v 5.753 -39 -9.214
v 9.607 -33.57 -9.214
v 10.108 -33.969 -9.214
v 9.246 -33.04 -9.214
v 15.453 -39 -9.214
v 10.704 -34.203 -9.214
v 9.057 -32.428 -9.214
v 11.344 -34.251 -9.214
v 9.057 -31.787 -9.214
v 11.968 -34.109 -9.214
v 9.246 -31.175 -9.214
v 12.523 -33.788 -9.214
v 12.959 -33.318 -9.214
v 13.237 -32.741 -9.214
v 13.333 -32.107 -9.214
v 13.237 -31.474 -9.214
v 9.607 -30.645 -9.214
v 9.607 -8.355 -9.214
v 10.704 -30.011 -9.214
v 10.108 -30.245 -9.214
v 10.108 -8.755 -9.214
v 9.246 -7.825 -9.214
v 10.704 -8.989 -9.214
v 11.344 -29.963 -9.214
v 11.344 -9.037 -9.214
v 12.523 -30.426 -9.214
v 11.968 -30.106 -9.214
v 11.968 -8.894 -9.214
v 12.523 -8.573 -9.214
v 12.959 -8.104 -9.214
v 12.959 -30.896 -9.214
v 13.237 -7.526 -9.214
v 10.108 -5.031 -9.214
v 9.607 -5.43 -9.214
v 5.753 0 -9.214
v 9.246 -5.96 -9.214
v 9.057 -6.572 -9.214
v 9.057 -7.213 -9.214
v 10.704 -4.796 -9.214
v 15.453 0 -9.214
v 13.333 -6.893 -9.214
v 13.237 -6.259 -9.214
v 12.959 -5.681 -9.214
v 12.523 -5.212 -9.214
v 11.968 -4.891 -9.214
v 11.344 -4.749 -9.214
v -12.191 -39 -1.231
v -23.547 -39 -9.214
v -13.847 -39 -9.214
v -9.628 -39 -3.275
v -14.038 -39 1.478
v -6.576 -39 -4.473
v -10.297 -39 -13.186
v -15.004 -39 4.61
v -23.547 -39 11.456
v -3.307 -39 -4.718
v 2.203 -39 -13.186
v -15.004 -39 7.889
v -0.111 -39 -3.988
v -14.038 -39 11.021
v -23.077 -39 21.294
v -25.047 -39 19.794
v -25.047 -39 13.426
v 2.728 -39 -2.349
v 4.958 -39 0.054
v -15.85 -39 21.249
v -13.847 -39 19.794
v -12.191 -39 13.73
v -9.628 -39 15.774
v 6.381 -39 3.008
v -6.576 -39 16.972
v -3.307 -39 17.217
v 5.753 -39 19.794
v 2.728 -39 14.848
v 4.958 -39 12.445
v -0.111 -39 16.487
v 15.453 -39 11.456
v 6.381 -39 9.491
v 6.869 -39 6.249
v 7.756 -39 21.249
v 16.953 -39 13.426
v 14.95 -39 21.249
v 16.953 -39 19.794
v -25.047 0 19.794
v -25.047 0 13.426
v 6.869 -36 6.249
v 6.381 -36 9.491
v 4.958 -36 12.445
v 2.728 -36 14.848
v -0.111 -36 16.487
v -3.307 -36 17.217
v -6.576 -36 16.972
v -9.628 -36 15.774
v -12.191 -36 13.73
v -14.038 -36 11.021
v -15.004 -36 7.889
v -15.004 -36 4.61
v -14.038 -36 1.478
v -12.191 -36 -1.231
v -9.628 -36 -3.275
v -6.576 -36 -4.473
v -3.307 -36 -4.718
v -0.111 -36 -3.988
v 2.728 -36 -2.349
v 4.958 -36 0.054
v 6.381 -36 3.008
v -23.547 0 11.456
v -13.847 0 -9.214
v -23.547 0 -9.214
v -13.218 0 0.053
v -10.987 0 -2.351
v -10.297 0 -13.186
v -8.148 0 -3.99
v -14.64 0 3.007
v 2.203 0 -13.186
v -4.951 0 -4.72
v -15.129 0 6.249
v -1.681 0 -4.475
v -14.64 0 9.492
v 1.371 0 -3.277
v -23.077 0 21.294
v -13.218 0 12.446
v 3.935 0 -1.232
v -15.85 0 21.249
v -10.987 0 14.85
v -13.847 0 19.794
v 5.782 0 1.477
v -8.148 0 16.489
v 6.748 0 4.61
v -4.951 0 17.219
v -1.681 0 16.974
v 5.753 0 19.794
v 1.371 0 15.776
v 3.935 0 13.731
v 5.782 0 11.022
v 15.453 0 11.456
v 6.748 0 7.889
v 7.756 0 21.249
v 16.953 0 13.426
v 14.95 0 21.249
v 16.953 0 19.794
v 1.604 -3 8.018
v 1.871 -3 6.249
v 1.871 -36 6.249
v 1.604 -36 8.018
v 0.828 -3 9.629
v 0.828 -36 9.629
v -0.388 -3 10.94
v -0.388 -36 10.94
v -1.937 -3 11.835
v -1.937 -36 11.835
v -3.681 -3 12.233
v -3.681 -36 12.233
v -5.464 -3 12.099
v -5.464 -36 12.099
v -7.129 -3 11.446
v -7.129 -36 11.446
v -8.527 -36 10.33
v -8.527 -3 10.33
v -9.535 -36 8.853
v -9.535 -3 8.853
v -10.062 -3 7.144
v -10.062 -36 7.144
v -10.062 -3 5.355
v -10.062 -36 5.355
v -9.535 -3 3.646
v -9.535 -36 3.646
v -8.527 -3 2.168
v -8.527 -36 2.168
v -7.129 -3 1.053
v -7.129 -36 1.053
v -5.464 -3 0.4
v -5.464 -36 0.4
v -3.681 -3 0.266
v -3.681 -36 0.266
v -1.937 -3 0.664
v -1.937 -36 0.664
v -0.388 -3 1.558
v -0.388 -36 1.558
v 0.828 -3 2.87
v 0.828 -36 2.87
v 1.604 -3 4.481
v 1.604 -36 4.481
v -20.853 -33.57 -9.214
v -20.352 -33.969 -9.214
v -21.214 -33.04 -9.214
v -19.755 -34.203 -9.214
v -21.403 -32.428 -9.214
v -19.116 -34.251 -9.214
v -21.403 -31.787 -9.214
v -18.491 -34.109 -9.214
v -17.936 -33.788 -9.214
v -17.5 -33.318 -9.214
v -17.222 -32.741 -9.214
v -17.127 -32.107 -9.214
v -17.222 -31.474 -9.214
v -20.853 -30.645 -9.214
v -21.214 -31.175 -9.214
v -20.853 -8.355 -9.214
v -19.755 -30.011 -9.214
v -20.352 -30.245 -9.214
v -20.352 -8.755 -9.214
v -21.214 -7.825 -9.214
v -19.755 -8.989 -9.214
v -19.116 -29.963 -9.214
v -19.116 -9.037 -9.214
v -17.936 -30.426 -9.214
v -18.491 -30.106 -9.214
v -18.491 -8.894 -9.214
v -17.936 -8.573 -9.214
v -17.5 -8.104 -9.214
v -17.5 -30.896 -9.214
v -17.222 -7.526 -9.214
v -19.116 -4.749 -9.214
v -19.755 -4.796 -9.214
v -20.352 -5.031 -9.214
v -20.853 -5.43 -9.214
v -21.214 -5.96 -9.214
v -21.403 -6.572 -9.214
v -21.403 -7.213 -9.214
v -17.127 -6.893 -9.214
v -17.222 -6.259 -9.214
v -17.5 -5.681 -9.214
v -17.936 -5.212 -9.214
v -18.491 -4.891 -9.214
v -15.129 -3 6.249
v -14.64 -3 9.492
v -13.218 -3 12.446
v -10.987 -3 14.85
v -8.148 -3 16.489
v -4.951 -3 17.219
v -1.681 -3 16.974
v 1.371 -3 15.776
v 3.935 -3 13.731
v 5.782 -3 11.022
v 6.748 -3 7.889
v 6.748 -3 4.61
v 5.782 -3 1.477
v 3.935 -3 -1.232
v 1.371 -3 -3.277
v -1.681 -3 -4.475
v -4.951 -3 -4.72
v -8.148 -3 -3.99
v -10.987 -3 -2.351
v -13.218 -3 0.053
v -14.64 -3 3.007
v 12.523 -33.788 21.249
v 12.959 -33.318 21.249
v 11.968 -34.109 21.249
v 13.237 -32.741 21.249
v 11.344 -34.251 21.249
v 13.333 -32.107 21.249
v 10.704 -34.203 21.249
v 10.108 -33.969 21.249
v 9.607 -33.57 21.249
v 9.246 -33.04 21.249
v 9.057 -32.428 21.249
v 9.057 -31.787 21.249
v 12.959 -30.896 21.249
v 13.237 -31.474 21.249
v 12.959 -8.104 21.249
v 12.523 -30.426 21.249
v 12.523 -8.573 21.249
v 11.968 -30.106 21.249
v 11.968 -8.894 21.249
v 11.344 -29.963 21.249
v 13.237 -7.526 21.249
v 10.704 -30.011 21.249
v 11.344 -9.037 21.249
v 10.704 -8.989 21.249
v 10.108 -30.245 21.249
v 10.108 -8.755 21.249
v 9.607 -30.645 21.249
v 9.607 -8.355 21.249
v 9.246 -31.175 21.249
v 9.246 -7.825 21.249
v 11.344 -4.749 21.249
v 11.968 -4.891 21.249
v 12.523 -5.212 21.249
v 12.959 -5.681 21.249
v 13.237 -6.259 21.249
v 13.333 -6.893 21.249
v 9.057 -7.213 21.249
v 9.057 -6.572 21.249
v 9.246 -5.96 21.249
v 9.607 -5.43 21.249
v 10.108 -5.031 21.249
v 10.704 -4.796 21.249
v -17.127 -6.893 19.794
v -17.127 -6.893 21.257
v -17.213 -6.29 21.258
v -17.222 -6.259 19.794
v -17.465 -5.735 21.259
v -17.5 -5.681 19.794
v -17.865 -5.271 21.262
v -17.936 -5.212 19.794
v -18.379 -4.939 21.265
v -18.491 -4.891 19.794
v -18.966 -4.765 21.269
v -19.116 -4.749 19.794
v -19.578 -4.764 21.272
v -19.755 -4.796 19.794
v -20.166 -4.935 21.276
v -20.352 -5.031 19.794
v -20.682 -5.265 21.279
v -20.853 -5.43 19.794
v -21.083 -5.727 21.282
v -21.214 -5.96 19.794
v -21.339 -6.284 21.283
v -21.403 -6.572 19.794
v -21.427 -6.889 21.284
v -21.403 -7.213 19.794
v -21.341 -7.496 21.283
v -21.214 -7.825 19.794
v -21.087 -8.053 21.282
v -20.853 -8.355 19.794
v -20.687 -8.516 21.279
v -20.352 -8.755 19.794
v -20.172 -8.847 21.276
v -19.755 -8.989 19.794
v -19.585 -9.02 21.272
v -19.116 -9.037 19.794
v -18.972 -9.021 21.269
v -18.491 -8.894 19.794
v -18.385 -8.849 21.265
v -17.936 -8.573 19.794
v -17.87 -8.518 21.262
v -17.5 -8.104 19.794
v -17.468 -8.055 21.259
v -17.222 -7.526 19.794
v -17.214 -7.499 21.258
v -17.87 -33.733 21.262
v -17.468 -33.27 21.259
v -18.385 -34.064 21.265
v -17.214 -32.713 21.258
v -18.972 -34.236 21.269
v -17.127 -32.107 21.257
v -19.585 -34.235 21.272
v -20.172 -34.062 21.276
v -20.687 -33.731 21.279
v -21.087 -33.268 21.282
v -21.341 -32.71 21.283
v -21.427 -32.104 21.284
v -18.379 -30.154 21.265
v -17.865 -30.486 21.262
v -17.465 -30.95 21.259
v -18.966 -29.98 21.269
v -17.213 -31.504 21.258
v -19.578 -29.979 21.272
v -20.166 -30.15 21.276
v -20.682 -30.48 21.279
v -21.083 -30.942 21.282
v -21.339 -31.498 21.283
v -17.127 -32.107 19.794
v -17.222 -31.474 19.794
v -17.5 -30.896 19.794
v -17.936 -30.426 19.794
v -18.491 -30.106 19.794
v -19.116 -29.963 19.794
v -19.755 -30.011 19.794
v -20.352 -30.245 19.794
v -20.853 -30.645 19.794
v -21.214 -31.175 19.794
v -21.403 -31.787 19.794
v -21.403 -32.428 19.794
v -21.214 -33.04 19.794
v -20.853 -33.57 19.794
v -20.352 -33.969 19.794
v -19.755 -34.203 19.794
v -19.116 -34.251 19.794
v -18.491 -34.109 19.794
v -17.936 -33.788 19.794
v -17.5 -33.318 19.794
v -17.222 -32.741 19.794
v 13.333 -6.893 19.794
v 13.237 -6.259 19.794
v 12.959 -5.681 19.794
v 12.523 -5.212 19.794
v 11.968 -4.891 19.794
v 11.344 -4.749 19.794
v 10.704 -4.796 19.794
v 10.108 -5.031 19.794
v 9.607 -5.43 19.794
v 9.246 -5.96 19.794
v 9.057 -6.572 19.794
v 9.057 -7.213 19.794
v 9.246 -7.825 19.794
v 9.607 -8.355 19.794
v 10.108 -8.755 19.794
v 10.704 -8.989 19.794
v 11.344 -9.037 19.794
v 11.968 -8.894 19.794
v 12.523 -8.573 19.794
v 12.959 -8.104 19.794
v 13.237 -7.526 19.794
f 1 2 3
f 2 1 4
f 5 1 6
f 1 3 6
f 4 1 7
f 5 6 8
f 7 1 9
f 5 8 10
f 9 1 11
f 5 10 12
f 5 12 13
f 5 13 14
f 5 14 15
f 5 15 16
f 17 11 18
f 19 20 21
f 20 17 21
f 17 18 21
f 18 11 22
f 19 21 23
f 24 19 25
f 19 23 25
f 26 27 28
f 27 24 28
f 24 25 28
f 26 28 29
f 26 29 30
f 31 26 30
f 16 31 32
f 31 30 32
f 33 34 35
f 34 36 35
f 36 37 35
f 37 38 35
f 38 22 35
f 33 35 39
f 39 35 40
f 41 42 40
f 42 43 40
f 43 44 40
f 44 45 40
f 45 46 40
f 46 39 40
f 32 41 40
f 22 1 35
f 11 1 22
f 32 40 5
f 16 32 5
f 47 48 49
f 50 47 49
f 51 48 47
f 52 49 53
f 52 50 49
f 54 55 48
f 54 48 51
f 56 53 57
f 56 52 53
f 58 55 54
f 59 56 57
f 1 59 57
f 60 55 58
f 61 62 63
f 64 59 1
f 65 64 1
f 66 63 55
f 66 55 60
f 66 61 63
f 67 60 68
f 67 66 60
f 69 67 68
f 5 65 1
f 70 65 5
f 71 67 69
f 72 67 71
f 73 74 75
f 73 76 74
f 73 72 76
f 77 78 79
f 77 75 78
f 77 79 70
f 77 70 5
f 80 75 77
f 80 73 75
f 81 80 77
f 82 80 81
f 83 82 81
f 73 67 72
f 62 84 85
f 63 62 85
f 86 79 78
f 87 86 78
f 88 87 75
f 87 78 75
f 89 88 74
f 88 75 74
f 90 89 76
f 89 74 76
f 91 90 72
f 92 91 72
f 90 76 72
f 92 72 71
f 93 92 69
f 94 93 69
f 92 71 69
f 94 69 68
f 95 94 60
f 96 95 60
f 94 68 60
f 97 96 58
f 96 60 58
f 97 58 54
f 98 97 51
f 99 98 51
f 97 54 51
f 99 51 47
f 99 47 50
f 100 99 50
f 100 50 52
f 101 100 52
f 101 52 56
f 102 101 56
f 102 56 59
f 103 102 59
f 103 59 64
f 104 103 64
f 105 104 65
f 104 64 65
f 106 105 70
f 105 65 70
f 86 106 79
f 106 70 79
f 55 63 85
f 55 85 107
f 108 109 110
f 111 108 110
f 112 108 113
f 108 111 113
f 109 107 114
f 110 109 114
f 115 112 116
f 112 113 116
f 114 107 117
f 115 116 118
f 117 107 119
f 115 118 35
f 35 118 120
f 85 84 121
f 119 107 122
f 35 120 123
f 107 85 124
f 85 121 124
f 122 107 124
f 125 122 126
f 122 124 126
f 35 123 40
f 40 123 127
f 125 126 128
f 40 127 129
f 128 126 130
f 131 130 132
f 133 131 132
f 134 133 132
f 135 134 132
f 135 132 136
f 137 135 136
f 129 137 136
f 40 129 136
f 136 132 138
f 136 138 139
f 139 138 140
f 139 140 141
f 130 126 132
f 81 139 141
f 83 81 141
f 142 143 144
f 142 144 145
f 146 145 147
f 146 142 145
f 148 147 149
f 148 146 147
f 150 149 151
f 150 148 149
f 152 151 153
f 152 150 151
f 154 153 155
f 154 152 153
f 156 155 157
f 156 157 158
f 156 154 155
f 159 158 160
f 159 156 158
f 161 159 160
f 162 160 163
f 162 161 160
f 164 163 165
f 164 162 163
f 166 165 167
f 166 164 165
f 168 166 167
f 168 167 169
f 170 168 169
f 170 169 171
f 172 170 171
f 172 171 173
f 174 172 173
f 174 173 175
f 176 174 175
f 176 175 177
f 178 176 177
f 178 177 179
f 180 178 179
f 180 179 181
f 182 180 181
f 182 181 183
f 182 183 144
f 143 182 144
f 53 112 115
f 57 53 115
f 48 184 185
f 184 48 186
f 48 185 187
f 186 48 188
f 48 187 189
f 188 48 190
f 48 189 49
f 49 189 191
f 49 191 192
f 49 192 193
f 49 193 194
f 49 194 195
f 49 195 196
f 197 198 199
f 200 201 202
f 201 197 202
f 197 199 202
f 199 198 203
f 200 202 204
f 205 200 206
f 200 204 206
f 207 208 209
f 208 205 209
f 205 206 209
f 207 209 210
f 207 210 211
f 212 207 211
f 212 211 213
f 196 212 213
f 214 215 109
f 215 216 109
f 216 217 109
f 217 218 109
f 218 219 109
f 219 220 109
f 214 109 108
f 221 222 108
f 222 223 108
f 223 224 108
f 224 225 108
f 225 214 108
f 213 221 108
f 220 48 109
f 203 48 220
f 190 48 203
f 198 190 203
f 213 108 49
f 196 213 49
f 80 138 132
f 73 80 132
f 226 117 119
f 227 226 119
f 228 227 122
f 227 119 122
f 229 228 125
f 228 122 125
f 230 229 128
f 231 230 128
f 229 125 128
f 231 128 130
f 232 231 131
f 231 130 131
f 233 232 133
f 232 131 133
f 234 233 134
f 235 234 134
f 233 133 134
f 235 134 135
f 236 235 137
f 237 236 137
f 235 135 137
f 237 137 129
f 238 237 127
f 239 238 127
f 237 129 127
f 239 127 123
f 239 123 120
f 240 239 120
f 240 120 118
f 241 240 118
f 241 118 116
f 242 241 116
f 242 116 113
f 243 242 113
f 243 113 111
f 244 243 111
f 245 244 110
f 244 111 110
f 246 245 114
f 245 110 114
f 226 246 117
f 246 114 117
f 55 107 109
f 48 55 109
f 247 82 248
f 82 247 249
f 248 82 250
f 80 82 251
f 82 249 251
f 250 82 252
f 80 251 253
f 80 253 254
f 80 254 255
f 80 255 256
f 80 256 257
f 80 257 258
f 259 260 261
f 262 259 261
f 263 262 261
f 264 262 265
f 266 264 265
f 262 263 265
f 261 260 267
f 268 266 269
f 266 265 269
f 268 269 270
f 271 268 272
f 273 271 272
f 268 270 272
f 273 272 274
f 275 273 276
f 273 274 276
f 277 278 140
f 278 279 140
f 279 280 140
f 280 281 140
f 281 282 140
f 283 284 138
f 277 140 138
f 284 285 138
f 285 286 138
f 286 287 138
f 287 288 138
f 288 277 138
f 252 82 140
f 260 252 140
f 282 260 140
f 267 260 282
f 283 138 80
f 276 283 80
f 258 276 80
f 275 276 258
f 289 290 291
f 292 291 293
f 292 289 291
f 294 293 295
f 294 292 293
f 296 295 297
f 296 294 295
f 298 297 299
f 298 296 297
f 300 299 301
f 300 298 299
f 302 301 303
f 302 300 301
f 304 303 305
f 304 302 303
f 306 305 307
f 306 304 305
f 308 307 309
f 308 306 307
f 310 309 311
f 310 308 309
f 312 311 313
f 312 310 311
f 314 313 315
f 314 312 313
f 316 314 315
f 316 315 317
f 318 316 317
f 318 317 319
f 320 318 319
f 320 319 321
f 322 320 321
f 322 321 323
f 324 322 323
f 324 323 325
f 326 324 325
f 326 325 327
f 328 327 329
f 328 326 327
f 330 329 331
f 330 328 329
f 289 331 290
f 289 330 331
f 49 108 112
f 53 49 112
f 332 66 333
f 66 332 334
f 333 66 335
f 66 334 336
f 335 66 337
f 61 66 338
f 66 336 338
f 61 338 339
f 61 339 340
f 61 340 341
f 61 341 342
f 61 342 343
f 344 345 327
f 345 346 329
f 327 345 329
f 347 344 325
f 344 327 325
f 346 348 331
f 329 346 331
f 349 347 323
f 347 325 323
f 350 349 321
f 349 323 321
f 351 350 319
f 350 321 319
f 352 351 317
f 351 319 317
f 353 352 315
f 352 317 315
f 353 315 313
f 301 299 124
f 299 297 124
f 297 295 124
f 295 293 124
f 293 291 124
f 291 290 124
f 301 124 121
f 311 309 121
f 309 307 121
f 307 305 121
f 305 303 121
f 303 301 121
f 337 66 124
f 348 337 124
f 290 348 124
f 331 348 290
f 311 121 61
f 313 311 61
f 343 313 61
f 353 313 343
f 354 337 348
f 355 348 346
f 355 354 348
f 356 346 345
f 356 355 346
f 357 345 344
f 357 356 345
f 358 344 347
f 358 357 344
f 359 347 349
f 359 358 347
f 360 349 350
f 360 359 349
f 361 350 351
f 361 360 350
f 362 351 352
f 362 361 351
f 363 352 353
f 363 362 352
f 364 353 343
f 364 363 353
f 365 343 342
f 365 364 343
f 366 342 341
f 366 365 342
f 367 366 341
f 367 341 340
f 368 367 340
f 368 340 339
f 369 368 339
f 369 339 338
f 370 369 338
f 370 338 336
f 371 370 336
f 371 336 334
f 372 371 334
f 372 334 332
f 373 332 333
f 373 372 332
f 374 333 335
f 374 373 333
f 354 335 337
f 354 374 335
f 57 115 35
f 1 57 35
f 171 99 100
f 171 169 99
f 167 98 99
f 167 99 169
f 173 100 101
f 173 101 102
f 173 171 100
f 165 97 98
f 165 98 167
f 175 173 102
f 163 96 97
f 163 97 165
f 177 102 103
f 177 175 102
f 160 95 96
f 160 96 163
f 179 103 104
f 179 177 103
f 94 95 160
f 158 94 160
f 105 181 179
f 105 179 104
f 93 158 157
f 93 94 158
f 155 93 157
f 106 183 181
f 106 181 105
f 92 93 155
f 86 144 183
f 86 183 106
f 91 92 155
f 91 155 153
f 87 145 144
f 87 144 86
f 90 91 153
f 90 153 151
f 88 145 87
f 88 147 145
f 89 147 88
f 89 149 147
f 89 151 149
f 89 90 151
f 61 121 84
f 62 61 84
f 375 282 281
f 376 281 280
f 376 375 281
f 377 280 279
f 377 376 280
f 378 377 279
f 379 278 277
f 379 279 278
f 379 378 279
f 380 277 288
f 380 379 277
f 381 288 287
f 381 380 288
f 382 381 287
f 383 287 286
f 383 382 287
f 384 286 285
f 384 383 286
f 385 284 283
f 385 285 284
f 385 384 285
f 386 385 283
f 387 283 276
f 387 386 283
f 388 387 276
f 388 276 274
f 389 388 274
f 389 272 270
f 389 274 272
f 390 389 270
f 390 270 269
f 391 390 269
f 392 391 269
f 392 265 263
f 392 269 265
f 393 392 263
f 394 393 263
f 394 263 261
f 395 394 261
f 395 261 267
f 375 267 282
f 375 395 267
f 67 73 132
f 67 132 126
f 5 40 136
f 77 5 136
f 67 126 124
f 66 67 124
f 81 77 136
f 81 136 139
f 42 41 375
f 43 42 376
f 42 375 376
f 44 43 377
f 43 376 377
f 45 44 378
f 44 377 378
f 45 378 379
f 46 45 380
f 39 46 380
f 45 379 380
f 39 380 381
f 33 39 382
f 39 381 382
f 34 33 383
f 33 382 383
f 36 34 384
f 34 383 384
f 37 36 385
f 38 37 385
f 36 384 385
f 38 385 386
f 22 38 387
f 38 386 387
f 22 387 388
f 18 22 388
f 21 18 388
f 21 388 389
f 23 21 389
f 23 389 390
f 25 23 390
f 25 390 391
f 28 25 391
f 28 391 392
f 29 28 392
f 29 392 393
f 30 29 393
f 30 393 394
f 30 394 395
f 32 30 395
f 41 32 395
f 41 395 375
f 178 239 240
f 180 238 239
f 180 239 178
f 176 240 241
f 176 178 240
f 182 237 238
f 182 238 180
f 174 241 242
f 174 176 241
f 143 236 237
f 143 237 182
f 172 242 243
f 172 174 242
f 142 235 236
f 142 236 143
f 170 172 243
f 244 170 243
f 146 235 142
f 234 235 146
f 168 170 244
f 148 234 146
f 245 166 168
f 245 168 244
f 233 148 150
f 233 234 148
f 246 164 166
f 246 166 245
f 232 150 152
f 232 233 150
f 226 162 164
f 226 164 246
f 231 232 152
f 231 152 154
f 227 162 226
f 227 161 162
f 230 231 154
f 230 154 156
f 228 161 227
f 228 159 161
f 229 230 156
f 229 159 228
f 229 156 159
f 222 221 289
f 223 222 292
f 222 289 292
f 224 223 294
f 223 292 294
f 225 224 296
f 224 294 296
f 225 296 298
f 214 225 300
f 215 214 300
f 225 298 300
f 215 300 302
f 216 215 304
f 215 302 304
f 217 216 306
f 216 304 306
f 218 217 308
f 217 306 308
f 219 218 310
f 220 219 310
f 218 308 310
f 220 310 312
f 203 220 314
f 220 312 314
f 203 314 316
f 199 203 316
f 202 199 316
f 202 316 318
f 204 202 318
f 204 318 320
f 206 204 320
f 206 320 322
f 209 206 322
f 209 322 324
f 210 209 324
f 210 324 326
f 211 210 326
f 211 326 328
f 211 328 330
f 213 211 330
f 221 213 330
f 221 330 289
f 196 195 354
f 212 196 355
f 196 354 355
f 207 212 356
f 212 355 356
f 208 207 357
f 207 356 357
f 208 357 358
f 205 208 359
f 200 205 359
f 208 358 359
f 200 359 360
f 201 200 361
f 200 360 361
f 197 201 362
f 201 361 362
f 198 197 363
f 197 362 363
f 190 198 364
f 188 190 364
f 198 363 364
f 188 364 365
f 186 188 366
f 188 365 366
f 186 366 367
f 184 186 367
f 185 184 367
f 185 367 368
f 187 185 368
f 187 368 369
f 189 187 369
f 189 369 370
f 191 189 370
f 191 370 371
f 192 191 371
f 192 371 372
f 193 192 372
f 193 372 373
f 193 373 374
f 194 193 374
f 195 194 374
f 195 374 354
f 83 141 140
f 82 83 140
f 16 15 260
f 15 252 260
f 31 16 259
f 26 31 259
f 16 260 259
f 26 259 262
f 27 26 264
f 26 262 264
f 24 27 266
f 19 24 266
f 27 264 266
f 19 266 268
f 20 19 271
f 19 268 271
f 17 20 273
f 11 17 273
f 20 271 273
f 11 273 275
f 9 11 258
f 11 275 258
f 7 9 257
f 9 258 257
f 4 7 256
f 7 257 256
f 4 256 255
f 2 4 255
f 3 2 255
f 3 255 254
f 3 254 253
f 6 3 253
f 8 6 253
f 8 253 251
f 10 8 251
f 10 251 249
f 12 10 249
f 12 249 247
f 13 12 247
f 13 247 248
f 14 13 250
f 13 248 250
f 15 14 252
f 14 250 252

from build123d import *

# Parameters (mm, degrees)
F0_R     = 6.000001
F1_DEPTH = 38.999922
F2_R     = 2.149996
F3_DEPTH = 39.751
F4_R     = 11.000003
F4_R_2   = 6.000001
F5_DEPTH = 2.999994
F6_R     = 10.9982
F6_R_2   = 6.000001
F7_DEPTH = 2.999994


with BuildPart() as f1:
    # F0 (on Front) → F1 (new body)
    with BuildSketch(Plane.XZ):
        Polygon((-23.076807, 21.293776), (-25.046914, 19.794005), (-25.046914, 13.42603), (-23.546917, 11.456095), (-23.546917, -9.2142), (-13.846911, -9.2142), (-10.296957, -13.185778), (2.203044, -13.185778), (5.752999, -9.2142), (15.453005, -9.2142), (15.453005, 11.456095), (16.953002, 13.42603), (16.953002, 19.794005), (14.949928, 21.249454), (7.756072, 21.249454), (5.752999, 19.794005), (-13.846911, 19.794005), (-15.849985, 21.249454), align=None)
        with Locations((-4.128998, 6.249459)):
            Circle(F0_R, mode=Mode.SUBTRACT)
    extrude(amount=F1_DEPTH)

    # F2 (on face) → F3 (cut, symmetric)
    with BuildSketch(Plane.XY.offset(19.794005)):
        with Locations((-19.276814, -6.892563)):
            Circle(F2_R)
        with Locations((-19.276814, -32.107359)):
            Circle(F2_R)
        with Locations((11.182902, -6.892563)):
            Circle(F2_R)
        with Locations((11.182902, -32.107359)):
            Circle(F2_R)
    extrude(amount=F3_DEPTH, both=True, mode=Mode.SUBTRACT)

    # F4 (on face) → F5 (cut)
    with BuildSketch(Plane(origin=(0, 0, 0), x_dir=(-1, 0, 0), z_dir=(0, 1, 0))):
        with Locations((4.128998, 6.249459)):
            Circle(F4_R)
        with Locations((4.128998, 6.249459)):
            Circle(F4_R_2, mode=Mode.SUBTRACT)
    extrude(amount=-F5_DEPTH, mode=Mode.SUBTRACT)

    # F6 (on face) → F7 (cut)
    with BuildSketch(Plane.XZ.offset(38.999922)):
        with Locations((-4.128998, 6.249459)):
            Circle(F6_R)
        with Locations((-4.128998, 6.249459)):
            Circle(F6_R_2, mode=Mode.SUBTRACT)
    extrude(amount=-F7_DEPTH, mode=Mode.SUBTRACT)


solid = f1.part
